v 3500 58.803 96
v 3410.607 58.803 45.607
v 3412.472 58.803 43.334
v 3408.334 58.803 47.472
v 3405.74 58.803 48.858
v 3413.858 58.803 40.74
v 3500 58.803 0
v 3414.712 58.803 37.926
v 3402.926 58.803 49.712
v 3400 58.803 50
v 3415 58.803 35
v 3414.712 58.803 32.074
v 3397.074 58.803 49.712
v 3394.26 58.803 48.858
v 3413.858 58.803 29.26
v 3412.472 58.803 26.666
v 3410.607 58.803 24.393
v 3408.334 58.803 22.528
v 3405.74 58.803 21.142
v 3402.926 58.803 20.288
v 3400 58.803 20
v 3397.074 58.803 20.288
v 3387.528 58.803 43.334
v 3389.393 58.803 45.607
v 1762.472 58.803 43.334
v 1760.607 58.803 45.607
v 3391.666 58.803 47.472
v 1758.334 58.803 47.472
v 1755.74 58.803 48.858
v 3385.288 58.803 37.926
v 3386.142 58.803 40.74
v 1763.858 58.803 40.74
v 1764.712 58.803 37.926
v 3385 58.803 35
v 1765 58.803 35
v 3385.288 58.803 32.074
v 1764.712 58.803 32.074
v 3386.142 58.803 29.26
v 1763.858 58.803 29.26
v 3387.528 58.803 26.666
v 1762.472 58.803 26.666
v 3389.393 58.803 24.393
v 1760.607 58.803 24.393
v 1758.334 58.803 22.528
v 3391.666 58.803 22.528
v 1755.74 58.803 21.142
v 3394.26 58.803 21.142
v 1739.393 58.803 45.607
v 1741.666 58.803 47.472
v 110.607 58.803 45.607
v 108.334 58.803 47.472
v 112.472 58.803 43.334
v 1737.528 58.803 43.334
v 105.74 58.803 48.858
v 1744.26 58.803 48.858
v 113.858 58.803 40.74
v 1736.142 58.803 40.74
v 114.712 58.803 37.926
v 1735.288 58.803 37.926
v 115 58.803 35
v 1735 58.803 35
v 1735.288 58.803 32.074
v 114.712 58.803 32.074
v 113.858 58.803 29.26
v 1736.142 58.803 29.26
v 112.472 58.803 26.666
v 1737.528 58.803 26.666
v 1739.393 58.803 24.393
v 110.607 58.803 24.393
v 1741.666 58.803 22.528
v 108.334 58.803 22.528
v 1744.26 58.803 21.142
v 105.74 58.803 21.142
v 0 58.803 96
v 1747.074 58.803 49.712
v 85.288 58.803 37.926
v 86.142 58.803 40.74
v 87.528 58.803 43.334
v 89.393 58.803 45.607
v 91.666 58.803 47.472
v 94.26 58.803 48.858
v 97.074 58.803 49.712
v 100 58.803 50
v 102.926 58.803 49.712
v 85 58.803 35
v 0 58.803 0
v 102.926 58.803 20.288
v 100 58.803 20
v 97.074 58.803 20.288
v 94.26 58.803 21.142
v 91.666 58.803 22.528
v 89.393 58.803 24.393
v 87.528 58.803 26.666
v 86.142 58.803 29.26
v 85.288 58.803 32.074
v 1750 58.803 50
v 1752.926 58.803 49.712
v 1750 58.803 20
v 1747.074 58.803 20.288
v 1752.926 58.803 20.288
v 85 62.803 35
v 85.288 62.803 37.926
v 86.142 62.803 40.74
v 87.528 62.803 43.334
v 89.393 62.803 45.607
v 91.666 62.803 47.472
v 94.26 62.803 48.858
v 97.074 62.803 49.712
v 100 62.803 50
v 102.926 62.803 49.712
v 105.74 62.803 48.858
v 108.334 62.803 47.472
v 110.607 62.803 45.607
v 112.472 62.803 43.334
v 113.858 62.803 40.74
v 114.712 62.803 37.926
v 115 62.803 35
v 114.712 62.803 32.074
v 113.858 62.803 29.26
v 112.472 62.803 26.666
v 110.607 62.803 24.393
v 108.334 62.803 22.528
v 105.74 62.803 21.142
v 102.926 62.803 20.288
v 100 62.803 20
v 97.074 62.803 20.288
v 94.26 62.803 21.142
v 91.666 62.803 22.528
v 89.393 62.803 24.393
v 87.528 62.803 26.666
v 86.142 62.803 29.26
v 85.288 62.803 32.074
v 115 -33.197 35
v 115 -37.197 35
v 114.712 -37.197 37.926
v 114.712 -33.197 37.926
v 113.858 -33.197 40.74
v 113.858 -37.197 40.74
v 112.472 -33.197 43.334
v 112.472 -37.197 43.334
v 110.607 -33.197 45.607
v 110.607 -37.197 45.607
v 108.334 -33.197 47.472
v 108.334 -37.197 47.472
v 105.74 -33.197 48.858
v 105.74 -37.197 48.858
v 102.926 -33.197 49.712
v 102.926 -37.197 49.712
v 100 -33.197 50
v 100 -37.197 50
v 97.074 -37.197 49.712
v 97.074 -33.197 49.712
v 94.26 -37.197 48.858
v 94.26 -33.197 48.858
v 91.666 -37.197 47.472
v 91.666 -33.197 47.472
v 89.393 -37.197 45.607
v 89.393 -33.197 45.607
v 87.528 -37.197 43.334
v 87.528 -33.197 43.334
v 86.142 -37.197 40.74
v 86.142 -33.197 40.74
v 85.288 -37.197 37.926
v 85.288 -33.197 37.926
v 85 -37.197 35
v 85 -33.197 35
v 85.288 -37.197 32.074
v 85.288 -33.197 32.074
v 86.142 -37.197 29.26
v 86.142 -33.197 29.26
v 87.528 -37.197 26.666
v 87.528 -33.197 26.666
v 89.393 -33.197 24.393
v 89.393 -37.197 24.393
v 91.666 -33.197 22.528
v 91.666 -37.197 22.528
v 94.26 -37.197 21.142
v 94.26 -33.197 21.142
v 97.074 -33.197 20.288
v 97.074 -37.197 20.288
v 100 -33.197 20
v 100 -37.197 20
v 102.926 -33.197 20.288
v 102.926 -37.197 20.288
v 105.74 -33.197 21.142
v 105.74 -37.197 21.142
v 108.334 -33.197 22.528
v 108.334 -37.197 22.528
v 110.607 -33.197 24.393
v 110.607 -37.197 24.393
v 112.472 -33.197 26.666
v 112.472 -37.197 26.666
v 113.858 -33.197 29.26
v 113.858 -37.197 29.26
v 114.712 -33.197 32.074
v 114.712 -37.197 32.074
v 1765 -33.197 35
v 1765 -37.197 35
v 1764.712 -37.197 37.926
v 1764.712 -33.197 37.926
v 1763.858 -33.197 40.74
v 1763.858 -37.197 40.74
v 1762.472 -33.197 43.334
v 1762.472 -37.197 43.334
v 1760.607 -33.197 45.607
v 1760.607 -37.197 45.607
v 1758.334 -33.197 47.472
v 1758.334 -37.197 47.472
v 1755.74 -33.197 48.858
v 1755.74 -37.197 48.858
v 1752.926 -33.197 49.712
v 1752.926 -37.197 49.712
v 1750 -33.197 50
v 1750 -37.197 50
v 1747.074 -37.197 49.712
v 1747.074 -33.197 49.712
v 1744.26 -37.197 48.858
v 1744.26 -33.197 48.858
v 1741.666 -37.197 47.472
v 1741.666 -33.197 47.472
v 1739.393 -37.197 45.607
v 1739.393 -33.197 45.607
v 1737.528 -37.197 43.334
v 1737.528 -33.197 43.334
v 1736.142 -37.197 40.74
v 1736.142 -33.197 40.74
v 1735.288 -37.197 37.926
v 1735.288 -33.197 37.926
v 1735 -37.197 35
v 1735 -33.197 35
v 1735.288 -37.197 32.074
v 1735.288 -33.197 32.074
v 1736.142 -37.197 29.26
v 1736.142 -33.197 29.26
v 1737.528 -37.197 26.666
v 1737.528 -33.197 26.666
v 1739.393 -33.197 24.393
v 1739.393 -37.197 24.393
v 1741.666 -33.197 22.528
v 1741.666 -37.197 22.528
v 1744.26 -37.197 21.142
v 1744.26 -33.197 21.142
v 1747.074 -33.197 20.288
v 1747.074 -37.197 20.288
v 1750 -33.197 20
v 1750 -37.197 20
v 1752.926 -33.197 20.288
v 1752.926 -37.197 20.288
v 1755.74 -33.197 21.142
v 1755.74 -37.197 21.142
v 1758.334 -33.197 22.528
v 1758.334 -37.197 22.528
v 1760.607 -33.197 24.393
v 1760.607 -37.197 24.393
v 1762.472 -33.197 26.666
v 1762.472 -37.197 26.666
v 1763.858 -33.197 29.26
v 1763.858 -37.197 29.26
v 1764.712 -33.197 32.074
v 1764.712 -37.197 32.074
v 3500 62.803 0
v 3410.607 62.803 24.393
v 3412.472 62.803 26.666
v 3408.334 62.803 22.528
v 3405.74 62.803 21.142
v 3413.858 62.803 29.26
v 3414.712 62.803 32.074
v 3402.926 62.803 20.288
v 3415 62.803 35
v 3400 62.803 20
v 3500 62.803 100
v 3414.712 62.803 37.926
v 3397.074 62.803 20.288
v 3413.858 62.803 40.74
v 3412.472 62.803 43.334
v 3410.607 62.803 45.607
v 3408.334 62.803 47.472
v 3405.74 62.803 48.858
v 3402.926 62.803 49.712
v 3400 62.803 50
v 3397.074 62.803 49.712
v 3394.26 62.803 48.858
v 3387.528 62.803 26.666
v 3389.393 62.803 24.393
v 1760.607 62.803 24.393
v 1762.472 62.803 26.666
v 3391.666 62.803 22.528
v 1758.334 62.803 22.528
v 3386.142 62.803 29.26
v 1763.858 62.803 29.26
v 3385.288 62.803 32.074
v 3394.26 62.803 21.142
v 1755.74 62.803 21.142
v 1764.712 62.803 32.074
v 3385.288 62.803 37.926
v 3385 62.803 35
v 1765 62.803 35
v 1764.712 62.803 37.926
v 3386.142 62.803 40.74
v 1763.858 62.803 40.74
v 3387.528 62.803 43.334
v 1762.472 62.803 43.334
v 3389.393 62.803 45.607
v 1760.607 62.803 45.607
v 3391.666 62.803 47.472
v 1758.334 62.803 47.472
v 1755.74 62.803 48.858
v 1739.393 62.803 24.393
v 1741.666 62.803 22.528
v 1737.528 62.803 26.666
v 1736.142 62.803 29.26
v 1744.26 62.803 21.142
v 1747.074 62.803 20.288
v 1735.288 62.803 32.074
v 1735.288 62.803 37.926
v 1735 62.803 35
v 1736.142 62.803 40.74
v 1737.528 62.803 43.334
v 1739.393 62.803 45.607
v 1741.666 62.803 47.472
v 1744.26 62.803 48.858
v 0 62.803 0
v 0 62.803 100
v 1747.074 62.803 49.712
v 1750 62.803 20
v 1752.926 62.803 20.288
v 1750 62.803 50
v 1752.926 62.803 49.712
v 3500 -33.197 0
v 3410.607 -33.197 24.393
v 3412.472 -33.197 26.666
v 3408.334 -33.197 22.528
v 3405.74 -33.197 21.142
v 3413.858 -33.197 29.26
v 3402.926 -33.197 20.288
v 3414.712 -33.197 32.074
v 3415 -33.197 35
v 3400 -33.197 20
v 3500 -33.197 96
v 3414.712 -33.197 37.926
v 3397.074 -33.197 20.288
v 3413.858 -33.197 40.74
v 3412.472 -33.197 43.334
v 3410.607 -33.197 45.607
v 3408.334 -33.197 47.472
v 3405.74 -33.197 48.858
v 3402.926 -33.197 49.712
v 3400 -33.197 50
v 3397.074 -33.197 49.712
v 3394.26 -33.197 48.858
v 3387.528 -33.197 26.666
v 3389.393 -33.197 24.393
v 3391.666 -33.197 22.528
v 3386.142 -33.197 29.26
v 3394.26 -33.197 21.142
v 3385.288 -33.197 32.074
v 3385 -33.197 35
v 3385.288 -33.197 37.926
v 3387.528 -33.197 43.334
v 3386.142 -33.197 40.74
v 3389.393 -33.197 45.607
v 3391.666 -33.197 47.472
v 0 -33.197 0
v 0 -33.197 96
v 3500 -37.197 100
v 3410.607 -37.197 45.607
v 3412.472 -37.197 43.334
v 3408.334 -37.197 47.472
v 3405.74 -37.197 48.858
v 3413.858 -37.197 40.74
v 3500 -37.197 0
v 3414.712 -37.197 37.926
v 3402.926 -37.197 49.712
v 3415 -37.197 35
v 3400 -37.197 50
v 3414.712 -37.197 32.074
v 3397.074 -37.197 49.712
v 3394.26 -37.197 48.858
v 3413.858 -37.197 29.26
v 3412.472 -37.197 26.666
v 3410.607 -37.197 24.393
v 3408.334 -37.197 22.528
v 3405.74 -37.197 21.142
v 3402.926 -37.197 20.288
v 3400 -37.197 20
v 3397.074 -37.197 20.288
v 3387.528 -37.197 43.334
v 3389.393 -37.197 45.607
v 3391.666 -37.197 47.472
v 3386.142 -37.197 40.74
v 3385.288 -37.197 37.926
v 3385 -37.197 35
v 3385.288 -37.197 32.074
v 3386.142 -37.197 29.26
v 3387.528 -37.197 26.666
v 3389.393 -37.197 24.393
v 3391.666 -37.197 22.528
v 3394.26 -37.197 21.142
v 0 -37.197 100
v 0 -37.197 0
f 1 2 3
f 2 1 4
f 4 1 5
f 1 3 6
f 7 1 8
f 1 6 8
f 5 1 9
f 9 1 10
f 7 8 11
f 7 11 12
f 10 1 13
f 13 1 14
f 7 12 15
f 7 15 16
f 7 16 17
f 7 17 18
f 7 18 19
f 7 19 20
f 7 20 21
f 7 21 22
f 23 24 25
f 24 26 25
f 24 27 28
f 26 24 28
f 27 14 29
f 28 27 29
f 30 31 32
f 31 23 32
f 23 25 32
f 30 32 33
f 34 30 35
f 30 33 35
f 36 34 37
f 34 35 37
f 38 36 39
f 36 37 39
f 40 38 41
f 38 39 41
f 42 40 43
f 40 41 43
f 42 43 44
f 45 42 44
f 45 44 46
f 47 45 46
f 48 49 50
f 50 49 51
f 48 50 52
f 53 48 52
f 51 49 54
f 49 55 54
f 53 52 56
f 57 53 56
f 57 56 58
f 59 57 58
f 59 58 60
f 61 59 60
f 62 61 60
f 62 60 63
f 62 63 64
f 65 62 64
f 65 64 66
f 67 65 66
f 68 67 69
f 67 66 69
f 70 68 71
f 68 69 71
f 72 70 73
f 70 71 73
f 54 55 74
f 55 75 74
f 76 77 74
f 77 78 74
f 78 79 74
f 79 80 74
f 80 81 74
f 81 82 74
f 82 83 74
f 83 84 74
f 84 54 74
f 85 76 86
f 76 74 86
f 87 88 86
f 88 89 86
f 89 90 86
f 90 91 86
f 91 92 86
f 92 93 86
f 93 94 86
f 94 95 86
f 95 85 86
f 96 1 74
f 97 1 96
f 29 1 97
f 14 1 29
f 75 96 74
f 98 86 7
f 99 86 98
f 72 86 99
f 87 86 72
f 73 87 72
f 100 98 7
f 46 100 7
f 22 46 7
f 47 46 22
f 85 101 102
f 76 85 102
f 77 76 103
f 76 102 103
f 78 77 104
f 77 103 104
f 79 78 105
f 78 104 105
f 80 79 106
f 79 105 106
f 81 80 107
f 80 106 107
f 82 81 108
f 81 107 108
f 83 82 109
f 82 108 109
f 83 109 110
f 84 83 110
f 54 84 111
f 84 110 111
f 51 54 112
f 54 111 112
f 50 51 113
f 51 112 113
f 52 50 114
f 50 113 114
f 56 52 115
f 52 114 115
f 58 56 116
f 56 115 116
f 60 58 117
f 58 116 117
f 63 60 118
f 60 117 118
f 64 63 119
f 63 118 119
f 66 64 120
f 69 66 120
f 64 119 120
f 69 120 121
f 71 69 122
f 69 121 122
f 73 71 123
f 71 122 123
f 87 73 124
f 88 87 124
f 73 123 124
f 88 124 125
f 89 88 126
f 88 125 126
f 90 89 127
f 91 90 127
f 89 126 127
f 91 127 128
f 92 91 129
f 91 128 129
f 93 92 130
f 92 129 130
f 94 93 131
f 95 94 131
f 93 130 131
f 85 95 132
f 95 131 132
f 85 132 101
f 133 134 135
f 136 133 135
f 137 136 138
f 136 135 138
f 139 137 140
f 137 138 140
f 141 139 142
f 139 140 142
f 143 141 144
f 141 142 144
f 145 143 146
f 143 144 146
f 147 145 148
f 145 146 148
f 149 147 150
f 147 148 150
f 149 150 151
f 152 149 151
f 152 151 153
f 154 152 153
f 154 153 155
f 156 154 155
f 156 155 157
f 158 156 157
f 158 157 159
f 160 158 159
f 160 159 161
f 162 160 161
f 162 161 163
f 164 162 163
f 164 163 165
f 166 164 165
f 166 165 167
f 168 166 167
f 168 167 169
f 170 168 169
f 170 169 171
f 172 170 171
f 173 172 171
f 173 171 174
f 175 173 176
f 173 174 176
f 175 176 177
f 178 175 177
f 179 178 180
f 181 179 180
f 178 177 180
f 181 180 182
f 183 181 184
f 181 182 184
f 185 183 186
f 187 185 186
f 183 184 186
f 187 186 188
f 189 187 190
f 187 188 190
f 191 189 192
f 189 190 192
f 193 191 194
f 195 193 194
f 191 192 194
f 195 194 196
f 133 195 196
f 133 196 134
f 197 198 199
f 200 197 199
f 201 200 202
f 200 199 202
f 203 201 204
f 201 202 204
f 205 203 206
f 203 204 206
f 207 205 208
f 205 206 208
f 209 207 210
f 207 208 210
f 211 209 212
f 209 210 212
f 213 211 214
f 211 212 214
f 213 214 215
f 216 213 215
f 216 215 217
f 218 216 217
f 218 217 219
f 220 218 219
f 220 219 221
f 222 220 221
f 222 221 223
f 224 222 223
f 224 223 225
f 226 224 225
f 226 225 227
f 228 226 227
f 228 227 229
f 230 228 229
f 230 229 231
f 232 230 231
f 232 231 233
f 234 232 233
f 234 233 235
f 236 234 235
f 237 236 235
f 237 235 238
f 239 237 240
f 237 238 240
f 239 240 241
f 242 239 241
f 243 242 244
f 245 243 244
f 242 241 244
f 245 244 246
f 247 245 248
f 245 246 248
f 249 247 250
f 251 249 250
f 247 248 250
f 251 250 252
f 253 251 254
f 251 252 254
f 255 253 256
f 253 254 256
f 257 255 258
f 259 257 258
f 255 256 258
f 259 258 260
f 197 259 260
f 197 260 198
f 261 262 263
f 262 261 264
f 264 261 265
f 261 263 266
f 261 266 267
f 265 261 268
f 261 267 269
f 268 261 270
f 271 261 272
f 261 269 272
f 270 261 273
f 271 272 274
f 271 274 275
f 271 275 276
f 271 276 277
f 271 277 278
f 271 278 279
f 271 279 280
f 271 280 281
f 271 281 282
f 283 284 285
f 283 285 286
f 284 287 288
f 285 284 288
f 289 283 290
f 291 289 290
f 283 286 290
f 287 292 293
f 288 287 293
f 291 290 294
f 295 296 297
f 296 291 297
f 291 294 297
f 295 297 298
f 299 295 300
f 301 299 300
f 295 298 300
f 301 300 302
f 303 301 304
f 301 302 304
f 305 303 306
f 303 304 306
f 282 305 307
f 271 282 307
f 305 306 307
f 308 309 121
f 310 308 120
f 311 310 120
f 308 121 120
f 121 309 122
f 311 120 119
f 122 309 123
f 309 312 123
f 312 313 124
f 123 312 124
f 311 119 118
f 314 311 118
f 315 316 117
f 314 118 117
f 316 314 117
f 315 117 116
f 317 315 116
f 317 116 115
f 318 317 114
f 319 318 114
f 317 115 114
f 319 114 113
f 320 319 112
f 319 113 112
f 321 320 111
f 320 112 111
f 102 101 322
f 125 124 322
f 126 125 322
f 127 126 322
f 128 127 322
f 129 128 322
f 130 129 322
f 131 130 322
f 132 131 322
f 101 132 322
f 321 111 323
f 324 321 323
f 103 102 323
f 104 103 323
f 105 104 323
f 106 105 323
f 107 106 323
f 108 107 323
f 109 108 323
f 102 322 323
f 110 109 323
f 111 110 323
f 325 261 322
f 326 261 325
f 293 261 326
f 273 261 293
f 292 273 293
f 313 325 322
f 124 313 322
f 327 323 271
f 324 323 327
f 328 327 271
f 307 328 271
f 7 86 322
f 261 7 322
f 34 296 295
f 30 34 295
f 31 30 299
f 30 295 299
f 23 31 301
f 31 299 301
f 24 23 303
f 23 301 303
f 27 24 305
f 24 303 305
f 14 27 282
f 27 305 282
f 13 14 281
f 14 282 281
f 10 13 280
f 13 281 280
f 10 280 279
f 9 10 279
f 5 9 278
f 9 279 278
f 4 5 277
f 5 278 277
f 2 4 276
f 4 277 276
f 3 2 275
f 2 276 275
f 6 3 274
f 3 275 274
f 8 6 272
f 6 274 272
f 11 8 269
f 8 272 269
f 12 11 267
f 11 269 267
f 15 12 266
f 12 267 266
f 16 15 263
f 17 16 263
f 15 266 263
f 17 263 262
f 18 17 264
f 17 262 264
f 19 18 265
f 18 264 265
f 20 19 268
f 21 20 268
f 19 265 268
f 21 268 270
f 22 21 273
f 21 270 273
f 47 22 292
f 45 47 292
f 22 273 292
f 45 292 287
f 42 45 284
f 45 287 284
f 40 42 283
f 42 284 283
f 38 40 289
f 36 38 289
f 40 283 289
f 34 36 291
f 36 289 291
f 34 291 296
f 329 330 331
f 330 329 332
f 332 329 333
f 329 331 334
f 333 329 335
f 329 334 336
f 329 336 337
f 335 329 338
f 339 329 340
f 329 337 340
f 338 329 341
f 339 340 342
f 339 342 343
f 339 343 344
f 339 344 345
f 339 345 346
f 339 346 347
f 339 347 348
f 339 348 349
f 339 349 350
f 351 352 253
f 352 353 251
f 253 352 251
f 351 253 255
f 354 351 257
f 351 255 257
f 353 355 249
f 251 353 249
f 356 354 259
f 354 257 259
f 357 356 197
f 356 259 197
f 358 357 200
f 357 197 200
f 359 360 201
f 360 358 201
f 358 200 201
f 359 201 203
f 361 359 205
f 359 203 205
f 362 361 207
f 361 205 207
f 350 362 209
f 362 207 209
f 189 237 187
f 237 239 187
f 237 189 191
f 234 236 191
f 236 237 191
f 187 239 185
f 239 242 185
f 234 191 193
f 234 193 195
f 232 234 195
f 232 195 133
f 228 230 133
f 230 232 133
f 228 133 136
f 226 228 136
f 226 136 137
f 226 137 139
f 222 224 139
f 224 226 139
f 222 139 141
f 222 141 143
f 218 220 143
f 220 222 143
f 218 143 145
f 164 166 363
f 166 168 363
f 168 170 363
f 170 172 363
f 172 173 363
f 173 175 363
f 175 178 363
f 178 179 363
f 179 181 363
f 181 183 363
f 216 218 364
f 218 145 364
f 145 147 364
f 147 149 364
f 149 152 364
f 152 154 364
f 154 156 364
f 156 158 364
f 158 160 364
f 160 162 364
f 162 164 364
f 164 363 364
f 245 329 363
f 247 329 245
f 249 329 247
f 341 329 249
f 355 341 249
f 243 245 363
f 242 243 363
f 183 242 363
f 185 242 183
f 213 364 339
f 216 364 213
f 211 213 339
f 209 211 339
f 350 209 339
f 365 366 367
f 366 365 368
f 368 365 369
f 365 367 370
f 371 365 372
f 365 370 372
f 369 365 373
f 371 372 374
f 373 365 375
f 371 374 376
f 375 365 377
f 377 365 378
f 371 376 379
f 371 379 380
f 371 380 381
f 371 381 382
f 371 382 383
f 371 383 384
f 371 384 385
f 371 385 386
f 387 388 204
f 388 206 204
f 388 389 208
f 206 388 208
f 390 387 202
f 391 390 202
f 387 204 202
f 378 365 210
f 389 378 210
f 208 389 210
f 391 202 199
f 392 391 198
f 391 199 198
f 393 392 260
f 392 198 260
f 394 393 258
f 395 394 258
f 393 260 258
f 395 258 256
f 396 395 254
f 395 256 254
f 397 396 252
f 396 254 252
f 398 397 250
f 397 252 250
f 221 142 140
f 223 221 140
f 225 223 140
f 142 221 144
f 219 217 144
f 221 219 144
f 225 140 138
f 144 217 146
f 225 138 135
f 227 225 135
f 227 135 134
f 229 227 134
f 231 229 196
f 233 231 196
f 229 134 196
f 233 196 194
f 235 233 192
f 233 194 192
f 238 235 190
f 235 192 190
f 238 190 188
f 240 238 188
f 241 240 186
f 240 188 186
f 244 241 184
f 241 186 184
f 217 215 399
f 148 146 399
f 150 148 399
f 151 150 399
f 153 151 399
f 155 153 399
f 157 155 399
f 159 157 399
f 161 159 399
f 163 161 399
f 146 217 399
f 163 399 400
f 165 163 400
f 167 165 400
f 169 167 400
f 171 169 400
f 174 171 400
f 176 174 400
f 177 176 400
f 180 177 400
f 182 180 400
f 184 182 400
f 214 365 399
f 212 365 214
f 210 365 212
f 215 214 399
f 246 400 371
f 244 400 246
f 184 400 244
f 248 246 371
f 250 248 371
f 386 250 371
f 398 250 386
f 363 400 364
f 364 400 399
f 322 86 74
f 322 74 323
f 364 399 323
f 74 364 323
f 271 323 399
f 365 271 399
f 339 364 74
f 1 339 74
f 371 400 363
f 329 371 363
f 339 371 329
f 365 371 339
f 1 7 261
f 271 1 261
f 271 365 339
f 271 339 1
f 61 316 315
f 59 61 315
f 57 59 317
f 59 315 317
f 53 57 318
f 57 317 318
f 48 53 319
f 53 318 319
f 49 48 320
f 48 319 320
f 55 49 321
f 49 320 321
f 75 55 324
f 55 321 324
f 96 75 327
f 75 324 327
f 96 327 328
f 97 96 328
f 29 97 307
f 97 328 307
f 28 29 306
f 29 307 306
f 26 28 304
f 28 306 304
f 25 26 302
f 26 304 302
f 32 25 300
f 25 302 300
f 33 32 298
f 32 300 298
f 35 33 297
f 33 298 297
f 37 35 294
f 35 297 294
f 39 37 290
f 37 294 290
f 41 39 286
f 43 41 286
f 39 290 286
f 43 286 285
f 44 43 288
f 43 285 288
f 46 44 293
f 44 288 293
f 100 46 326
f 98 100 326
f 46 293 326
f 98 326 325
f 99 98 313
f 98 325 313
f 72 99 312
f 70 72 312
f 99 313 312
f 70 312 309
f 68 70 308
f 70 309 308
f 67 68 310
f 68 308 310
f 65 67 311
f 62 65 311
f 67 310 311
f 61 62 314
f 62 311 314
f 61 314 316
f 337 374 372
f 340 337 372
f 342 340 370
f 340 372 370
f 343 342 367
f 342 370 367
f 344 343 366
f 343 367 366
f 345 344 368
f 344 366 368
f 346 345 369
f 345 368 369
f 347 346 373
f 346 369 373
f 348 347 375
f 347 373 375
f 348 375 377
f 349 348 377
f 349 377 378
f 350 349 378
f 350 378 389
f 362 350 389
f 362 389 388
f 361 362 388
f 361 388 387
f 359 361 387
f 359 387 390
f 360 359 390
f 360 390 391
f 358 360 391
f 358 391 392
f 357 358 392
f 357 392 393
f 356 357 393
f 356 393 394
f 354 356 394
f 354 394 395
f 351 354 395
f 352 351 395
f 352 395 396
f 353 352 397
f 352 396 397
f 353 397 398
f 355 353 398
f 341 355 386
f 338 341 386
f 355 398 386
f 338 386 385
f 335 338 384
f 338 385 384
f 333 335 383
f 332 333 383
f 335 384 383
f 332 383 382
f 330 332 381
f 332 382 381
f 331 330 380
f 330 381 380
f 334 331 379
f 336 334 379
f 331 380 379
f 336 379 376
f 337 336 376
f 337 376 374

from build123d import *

# Parameters (mm, degrees)
F1_DEPTH = 3500
F2_R     = 15
F3_DEPTH = 4
F4_R     = 15
F5_DEPTH = 5


with BuildPart() as f1:
    # F0 (on Right) → F1 (new body)
    with BuildSketch(Plane.YZ):
        Polygon((-37.197296, 100), (-37.197296, 0), (-33.197296, 0), (-33.197296, 96), (58.802704, 96), (58.802704, 0), (62.802704, 0), (62.802704, 100), align=None)
    extrude(amount=F1_DEPTH)

    # F2 (on face) → F3 (cut)
    with BuildSketch(Plane(origin=(0, 62.802704, 0), x_dir=(-1, 0, 0), z_dir=(0, 1, 0))):
        with Locations((-3400, 35)):
            Circle(F2_R)
        with Locations((-1750, 35)):
            Circle(F2_R)
        with Locations((-100, 35)):
            Circle(F2_R)
    extrude(amount=-F3_DEPTH, mode=Mode.SUBTRACT)

    # F4 (on face) → F5 (cut)
    with BuildSketch(Plane.XZ.offset(37.197296)):
        with Locations((100, 35)):
            Circle(F4_R)
        with Locations((1750, 35)):
            Circle(F4_R)
        with Locations((3400, 35)):
            Circle(F4_R)
    extrude(amount=-F5_DEPTH, mode=Mode.SUBTRACT)


solid = f1.part
